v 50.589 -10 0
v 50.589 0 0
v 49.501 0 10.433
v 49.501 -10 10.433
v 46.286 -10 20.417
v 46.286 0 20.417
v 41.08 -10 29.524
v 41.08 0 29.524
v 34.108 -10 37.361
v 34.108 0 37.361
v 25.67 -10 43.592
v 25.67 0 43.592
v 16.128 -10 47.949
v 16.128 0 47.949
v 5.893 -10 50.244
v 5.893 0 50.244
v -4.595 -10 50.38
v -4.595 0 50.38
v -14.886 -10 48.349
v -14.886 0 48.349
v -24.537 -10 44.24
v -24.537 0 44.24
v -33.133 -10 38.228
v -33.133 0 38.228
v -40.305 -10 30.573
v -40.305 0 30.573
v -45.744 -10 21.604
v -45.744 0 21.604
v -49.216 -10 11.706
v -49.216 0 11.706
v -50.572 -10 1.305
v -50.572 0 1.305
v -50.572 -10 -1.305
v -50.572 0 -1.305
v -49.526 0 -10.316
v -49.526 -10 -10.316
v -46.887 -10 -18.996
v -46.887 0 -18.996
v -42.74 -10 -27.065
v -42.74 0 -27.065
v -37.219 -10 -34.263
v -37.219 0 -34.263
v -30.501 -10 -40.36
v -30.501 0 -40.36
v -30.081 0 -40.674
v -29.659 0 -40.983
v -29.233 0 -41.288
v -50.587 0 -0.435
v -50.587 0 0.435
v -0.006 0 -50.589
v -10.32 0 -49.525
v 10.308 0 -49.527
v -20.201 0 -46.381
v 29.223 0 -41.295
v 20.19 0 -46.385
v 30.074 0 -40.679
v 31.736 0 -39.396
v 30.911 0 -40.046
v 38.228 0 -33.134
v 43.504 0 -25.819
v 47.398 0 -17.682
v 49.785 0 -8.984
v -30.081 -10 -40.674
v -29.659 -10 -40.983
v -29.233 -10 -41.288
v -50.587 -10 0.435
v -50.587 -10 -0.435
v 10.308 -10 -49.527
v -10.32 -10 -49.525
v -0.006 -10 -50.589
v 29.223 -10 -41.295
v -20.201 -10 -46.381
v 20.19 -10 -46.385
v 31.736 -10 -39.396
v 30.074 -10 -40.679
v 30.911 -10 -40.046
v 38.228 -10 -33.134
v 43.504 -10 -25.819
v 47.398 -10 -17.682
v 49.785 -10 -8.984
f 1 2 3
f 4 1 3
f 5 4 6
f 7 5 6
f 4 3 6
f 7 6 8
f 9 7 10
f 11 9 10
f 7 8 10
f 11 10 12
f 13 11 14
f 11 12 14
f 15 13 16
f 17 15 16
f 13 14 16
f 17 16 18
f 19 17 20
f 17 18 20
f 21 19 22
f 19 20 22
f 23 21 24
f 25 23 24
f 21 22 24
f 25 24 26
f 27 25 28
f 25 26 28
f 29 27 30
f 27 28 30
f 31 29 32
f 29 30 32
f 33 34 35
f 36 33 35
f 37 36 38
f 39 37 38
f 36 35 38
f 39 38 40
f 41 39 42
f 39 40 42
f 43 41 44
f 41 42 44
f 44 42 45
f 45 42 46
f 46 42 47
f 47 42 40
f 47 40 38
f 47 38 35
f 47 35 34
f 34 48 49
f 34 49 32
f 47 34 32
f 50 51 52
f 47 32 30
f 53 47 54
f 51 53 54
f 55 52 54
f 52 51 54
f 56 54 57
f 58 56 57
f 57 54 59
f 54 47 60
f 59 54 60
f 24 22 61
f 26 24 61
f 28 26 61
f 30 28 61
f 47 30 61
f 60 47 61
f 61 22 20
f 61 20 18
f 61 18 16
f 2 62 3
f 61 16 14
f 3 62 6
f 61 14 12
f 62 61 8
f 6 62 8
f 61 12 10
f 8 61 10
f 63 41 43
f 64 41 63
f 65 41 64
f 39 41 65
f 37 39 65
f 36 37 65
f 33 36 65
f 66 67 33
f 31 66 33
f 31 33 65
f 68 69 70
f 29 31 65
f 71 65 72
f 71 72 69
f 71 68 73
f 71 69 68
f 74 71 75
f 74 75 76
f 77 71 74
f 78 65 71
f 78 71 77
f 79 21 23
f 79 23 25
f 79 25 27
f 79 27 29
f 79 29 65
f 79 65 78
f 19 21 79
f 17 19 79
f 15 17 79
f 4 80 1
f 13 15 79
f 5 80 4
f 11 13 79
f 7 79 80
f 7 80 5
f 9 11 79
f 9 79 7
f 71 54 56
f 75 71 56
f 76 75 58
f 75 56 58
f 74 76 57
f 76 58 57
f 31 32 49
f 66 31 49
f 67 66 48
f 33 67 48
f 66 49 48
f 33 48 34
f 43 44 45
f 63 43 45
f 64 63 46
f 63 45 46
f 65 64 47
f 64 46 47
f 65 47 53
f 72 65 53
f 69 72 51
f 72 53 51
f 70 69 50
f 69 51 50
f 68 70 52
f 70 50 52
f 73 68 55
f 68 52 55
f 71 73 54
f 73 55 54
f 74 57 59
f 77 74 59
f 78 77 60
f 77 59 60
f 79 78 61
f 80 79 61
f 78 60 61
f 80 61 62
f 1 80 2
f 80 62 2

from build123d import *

# Parameters (mm, degrees)
F1_DEPTH = 10


# Not quite as in the source:
# - a feature names something its author has since deleted; it is built from what else it names


with BuildPart() as f1:
    # F0 (on Front) → F1 (new body)
    with BuildSketch(Plane.XZ):
        with BuildLine():
            ThreePointArc((0, 12.4140736889), (4.3797238065, 11.6158187371), (8.1961939537, 9.3237133283))
            Line((8.1961939537, 9.3237133283), (21.0697077151, 23.9681876437))
            ThreePointArc((21.0697077151, 23.9681876437), (18.4530079812, 27.8283575749), (18.0439527664, 32.4738611241))
            Line((18.0439527664, 32.4738611241), (12.5602155062, 33.3932852461))
            Line((12.5602155062, 33.3932852461), (7.5710593451, 36.5340338213))
            ThreePointArc((7.5710593451, 36.5340338213), (4.3242109258, 33.4682836339), (0, 32.3538112298))
            Line((0, 32.3538112298), (0, 12.4140736889))
        make_face()
        with BuildLine():
            ThreePointArc((-7.9262057201, 9.554291624), (-4.2131665816, 11.6772622181), (0, 12.4140736889))
            Line((0, 12.4140736889), (0, 32.3538112298))
            ThreePointArc((0, 32.3538112298), (-4.3563302657, 33.4861038791), (-7.6099407791, 36.5963641019))
            Line((-7.6099407791, 36.5963641019), (-12.278520326, 33.7106778775))
            Line((-12.278520326, 33.7106778775), (-17.78879081, 33.0882026957))
            ThreePointArc((-17.78879081, 33.0882026957), (-17.7466642393, 32.5900633313), (-17.73260723, 32.0903435349))
            ThreePointArc((-17.73260723, 32.0903435349), (-18.5760333574, 28.310954716), (-20.9462636845, 25.2487405378))
            Line((-20.9462636845, 25.2487405378), (-7.9262057201, 9.554291624))
        make_face()
        with BuildLine():
            Line((-12.278520326, 33.7106778775), (-7.6099407791, 36.5963641019))
            ThreePointArc((-7.6099407791, 36.5963641019), (-8.921680068, 41.9636267042), (-6.8304445709, 47.0778130421))
            ThreePointArc((-6.8304445709, 47.0778130421), (-17.0260006599, 47.3423785206), (-24.8514976267, 40.8016632631))
            ThreePointArc((-24.8514976267, 40.8016632631), (-20.0657845476, 38.0934673525), (-17.78879081, 33.0882026957))
            Line((-17.78879081, 33.0882026957), (-12.278520326, 33.7106778775))
        make_face()
        with BuildLine():
            ThreePointArc((-6.8304445709, 47.0778130421), (-8.921680068, 41.9636267042), (-7.6099407791, 36.5963641019))
            Line((-7.6099407791, 36.5963641019), (0, 41.3001291454))
            ThreePointArc((0, 41.3001291454), (-2.9563177988, 44.7314932731), (-6.8304445709, 47.0778130421))
        make_face()
        with BuildLine():
            ThreePointArc((-6.8304445709, 47.0778130421), (-2.9563177988, 44.7314932731), (0, 41.3001291454))
            ThreePointArc((0, 41.3001291454), (2.9670877078, 44.7179968563), (6.8263210631, 47.0826843755))
            ThreePointArc((6.8263210631, 47.0826843755), (-0.0031911285, 50.2464464918), (-6.8304445709, 47.0778130421))
        make_face()
        with BuildLine():
            Line((0, 41.3001291454), (7.5710593451, 36.5340338213))
            ThreePointArc((7.5710593451, 36.5340338213), (8.5956299393, 38.8198569439), (8.9463179156, 41.3001291454))
            ThreePointArc((8.9463179156, 41.3001291454), (8.3996143563, 44.3795906098), (6.8263210631, 47.0826843755))
            ThreePointArc((6.8263210631, 47.0826843755), (2.9670877078, 44.7179968563), (0, 41.3001291454))
        make_face()
        with BuildLine():
            Line((0, 41.3001291454), (0, 32.3538112298))
            ThreePointArc((0, 32.3538112298), (4.3242109258, 33.4682836339), (7.5710593451, 36.5340338213))
            Line((7.5710593451, 36.5340338213), (0, 41.3001291454))
        make_face()
        with BuildLine():
            ThreePointArc((-7.6099407791, 36.5963641019), (-4.3563302657, 33.4861038791), (0, 32.3538112298))
            Line((0, 32.3538112298), (0, 41.3001291454))
            Line((0, 41.3001291454), (-7.6099407791, 36.5963641019))
        make_face()
        with BuildLine():
            ThreePointArc((36.4223056753, 29.9139118839), (45.9083800473, 20.8806963335), (46.4937895072, 7.7947540314))
            ThreePointArc((46.4937895072, 7.7947540314), (49.4692239822, 4.3915233547), (50.5414702125, 0))
            ThreePointArc((50.5414702125, 0), (49.3916524089, -4.5377847699), (46.2196804198, -7.9804821571))
            ThreePointArc((46.2196804198, -7.9804821571), (45.2541028323, -22.5688235592), (34.2624022156, -32.2090809466))
            ThreePointArc((34.2624022156, -32.2090809466), (34.2845647661, -32.5811281227), (34.291956159, -32.953761518))
            ThreePointArc((34.291956159, -32.953761518), (33.6295574849, -36.4193105223), (31.7357494034, -39.3962708606))
            ThreePointArc((31.7357494034, -39.3962708606), (45.6327545118, -21.8374829955), (50.5887729434, 0))
            ThreePointArc((50.5887729434, 0), (0.6523386875, 50.5845668377), (-50.5719492199, 1.3045689002))
            ThreePointArc((-50.5719492199, 1.3045689002), (-49.1901644057, 5.1967911583), (-46.3448391854, 8.1905927165))
            ThreePointArc((-46.3448391854, 8.1905927165), (-45.5368746407, 21.848912941), (-35.4561087337, 31.0998954179))
            ThreePointArc((-35.4561087337, 31.0998954179), (-32.6224058372, 38.6491093328), (-24.8514976267, 40.8016632631))
            ThreePointArc((-24.8514976267, 40.8016632631), (-17.0260006599, 47.3423785206), (-6.8304445709, 47.0778130421))
            ThreePointArc((-6.8304445709, 47.0778130421), (-0.0031911285, 50.2464464918), (6.8263210631, 47.0826843755))
            ThreePointArc((6.8263210631, 47.0826843755), (17.6788975714, 47.324411831), (25.7932452382, 40.1137106881))
            ThreePointArc((25.7932452382, 40.1137106881), (33.2437406928, 37.9811469414), (36.4791003688, 30.9391189367))
            ThreePointArc((36.4791003688, 30.9391189367), (36.4648908183, 30.425729431), (36.4223056753, 29.9139118839))
        make_face()
        with BuildLine():
            ThreePointArc((-46.3448391854, 8.1905927165), (-40.2671562667, 9.9229363025), (-34.3745943291, 7.6388702415))
            Line((-34.3745943291, 7.6388702415), (-29.0687931112, 14.021677727))
            Line((-29.0687931112, 14.021677727), (-27.8149031494, 23.2813171291))
            ThreePointArc((-27.8149031494, 23.2813171291), (-32.9795051289, 25.8770971269), (-35.4561087337, 31.0998954179))
            ThreePointArc((-35.4561087337, 31.0998954179), (-45.5368746407, 21.848912941), (-46.3448391854, 8.1905927165))
        make_face()
        with BuildLine():
            ThreePointArc((-35.4561087337, 31.0998954179), (-32.9795051289, 25.8770971269), (-27.8149031494, 23.2813171291))
            Line((-27.8149031494, 23.2813171291), (-26.6220327467, 32.0903435349))
            ThreePointArc((-26.6220327467, 32.0903435349), (-31.1003542851, 32.1417240723), (-35.4561087337, 31.0998954179))
        make_face()
        with BuildLine():
            ThreePointArc((-35.4561087337, 31.0998954179), (-31.1003542851, 32.1417240723), (-26.6220327467, 32.0903435349))
            ThreePointArc((-26.6220327467, 32.0903435349), (-26.4240541647, 36.5856916795), (-24.8514976267, 40.8016632631))
            ThreePointArc((-24.8514976267, 40.8016632631), (-32.6224058372, 38.6491093328), (-35.4561087337, 31.0998954179))
        make_face()
        with BuildLine():
            ThreePointArc((-24.8514976267, 40.8016632631), (-26.4240541647, 36.5856916795), (-26.6220327467, 32.0903435349))
            Line((-26.6220327467, 32.0903435349), (-17.78879081, 33.0882026957))
            ThreePointArc((-17.78879081, 33.0882026957), (-20.0657845476, 38.0934673525), (-24.8514976267, 40.8016632631))
        make_face()
        with BuildLine():
            Line((-26.6220327467, 32.0903435349), (-20.9462636845, 25.2487405378))
            ThreePointArc((-20.9462636845, 25.2487405378), (-18.5760333574, 28.310954716), (-17.73260723, 32.0903435349))
            ThreePointArc((-17.73260723, 32.0903435349), (-17.7466642393, 32.5900633313), (-17.78879081, 33.0882026957))
            Line((-17.78879081, 33.0882026957), (-26.6220327467, 32.0903435349))
        make_face()
        with BuildLine():
            ThreePointArc((-27.8149031494, 23.2813171291), (-24.1742207002, 23.544578373), (-20.9462636845, 25.2487405378))
            Line((-20.9462636845, 25.2487405378), (-26.6220327467, 32.0903435349))
            Line((-26.6220327467, 32.0903435349), (-27.8149031494, 23.2813171291))
        make_face()
        with BuildLine():
            Line((-30.7910450859, 0), (-12.4140736889, 0))
            ThreePointArc((-12.4140736889, 0), (-11.2362299602, 5.27791264), (-7.9262057201, 9.554291624))
            Line((-7.9262057201, 9.554291624), (-20.9462636845, 25.2487405378))
            ThreePointArc((-20.9462636845, 25.2487405378), (-24.1742207002, 23.544578373), (-27.8149031494, 23.2813171291))
            Line((-27.8149031494, 23.2813171291), (-29.0687931112, 14.021677727))
            Line((-29.0687931112, 14.021677727), (-34.3745943291, 7.6388702415))
            ThreePointArc((-34.3745943291, 7.6388702415), (-31.7314462624, 4.2188317027), (-30.7910450859, 0))
        make_face()
        with BuildLine():
            ThreePointArc((-34.0750304122, -7.3795789352), (-31.6491009662, -4.0386490589), (-30.7910450859, 0))
            Line((-30.7910450859, 0), (-40.7245159149, 0))
            Line((-40.7245159149, 0), (-34.0750304122, -7.3795789352))
        make_face()
        with BuildLine():
            Line((-40.7245159149, 0), (-30.7910450859, 0))
            ThreePointArc((-30.7910450859, 0), (-31.7314462624, 4.2188317027), (-34.3745943291, 7.6388702415))
            Line((-34.3745943291, 7.6388702415), (-40.7245159149, 0))
        make_face()
        with BuildLine():
            Line((-40.7245159149, 0), (-34.3745943291, 7.6388702415))
            ThreePointArc((-34.3745943291, 7.6388702415), (-40.2671562667, 9.9229363025), (-46.3448391854, 8.1905927165))
            ThreePointArc((-46.3448391854, 8.1905927165), (-44.1031958217, 3.7051833857), (-40.7245159149, 0))
        make_face()
        with BuildLine():
            ThreePointArc((-46.139511468, -8.3277647585), (-43.9781949987, -3.8087367386), (-40.7245159149, 0))
            ThreePointArc((-40.7245159149, 0), (-44.1031958217, 3.7051833857), (-46.3448391854, 8.1905927165))
            ThreePointArc((-46.3448391854, 8.1905927165), (-49.1901644057, 5.1967911583), (-50.5719492199, 1.3045689002))
            ThreePointArc((-50.5719492199, 1.3045689002), (-50.5887729434, 0), (-50.5719492199, -1.3045689002))
            ThreePointArc((-50.5719492199, -1.3045689002), (-49.1249179099, -5.3016119279), (-46.139511468, -8.3277647585))
        make_face()
        with BuildLine():
            ThreePointArc((-46.139511468, -8.3277647585), (-39.9462129869, -9.9029332657), (-34.0750304122, -7.3795789352))
            Line((-34.0750304122, -7.3795789352), (-40.7245159149, 0))
            ThreePointArc((-40.7245159149, 0), (-43.9781949987, -3.8087367386), (-46.139511468, -8.3277647585))
        make_face()
        with BuildLine():
            ThreePointArc((-30.5009303557, -40.3598463247), (-33.0177016325, -36.8777345609), (-33.7279636415, -32.640427884))
            ThreePointArc((-33.7279636415, -32.640427884), (-44.9854308164, -23.0629718726), (-46.139511468, -8.3277647585))
            ThreePointArc((-46.139511468, -8.3277647585), (-49.1249179099, -5.3016119279), (-50.5719492199, -1.3045689002))
            ThreePointArc((-50.5719492199, -1.3045689002), (-44.9947955251, -23.1234150499), (-30.5009303557, -40.3598463247))
        make_face()
        with BuildLine():
            ThreePointArc((-33.7279636415, -32.640427884), (-31.3725828689, -26.9858355888), (-26.0396213441, -23.9722407284))
            Line((-26.0396213441, -23.9722407284), (-27.8331619734, -14.3067856835))
            Line((-27.8331619734, -14.3067856835), (-34.0750304122, -7.3795789352))
            ThreePointArc((-34.0750304122, -7.3795789352), (-39.9462129869, -9.9029332657), (-46.139511468, -8.3277647585))
            ThreePointArc((-46.139511468, -8.3277647585), (-44.9854308164, -23.0629718726), (-33.7279636415, -32.640427884))
        make_face()
        with BuildLine():
            Line((-18.7530413406, -25.632855502), (-7.3299455485, -10.0190380681))
            ThreePointArc((-7.3299455485, -10.0190380681), (-11.0703141267, -5.6175947424), (-12.4140736889, 0))
            Line((-12.4140736889, 0), (-30.7910450859, 0))
            ThreePointArc((-30.7910450859, 0), (-31.6491009662, -4.0386490589), (-34.0750304122, -7.3795789352))
            Line((-34.0750304122, -7.3795789352), (-27.8331619734, -14.3067856835))
            Line((-27.8331619734, -14.3067856835), (-26.0396213441, -23.9722407284))
            ThreePointArc((-26.0396213441, -23.9722407284), (-22.2247546471, -24.0496899951), (-18.7530413406, -25.632855502))
        make_face()
        with BuildLine():
            Line((-24.3195872754, -33.2415662706), (-18.7530413406, -25.632855502))
            ThreePointArc((-18.7530413406, -25.632855502), (-22.2247546471, -24.0496899951), (-26.0396213441, -23.9722407284))
            Line((-26.0396213441, -23.9722407284), (-24.3195872754, -33.2415662706))
        make_face()
        with BuildLine():
            Line((-24.3195872754, -33.2415662706), (-26.0396213441, -23.9722407284))
            ThreePointArc((-26.0396213441, -23.9722407284), (-31.3725828689, -26.9858355888), (-33.7279636415, -32.640427884))
            ThreePointArc((-33.7279636415, -32.640427884), (-29.0611287118, -33.5256103283), (-24.3195872754, -33.2415662706))
        make_face()
        with BuildLine():
            ThreePointArc((-22.7066374003, -42.5301240653), (-24.4011253438, -38.0400478438), (-24.3195872754, -33.2415662706))
            ThreePointArc((-24.3195872754, -33.2415662706), (-29.0611287118, -33.5256103283), (-33.7279636415, -32.640427884))
            ThreePointArc((-33.7279636415, -32.640427884), (-33.0177016325, -36.8777345609), (-30.5009303557, -40.3598463247))
            ThreePointArc((-30.5009303557, -40.3598463247), (-29.8703681269, -40.8287283157), (-29.2325991317, -41.2877596379))
            ThreePointArc((-29.2325991317, -41.2877596379), (-26.0826725293, -42.5027996438), (-22.7066374003, -42.5301240653))
        make_face()
        with BuildLine():
            Line((-15.0911921565, -35.1691649674), (-24.3195872754, -33.2415662706))
            ThreePointArc((-24.3195872754, -33.2415662706), (-24.4011253438, -38.0400478438), (-22.7066374003, -42.5301240653))
            ThreePointArc((-22.7066374003, -42.5301240653), (-17.7675173712, -40.0201570663), (-15.0911921565, -35.1691649674))
        make_face()
        with BuildLine():
            ThreePointArc((-14.8920259149, -33.2415662706), (-15.9125108938, -28.9754228225), (-18.7530413406, -25.632855502))
            Line((-18.7530413406, -25.632855502), (-24.3195872754, -33.2415662706))
            Line((-24.3195872754, -33.2415662706), (-15.0911921565, -35.1691649674))
            ThreePointArc((-15.0911921565, -35.1691649674), (-14.9419496612, -34.2104965993), (-14.8920259149, -33.2415662706))
        make_face()
        with BuildLine():
            Line((0, -31.5046176402), (0, -12.4140736889))
            ThreePointArc((0, -12.4140736889), (-3.8556548526, -11.8001335252), (-7.3299455485, -10.0190380681))
            Line((-7.3299455485, -10.0190380681), (-18.7530413406, -25.632855502))
            ThreePointArc((-18.7530413406, -25.632855502), (-15.9125108938, -28.9754228225), (-14.8920259149, -33.2415662706))
            ThreePointArc((-14.8920259149, -33.2415662706), (-14.9419496612, -34.2104965993), (-15.0911921565, -35.1691649674))
            Line((-15.0911921565, -35.1691649674), (-11.8124056821, -35.854027769))
            Line((-11.8124056821, -35.854027769), (-8.5237688791, -37.209996633))
            ThreePointArc((-8.5237688791, -37.209996633), (-5.1284984488, -33.0625960348), (0, -31.5046176402))
        make_face()
        with BuildLine():
            ThreePointArc((-6.3531457642, -47.4061283415), (-9.0178114186, -42.6442863227), (-8.5237688791, -37.209996633))
            Line((-8.5237688791, -37.209996633), (-11.8124056821, -35.854027769))
            Line((-11.8124056821, -35.854027769), (-15.0911921565, -35.1691649674))
            ThreePointArc((-15.0911921565, -35.1691649674), (-17.7675173712, -40.0201570663), (-22.7066374003, -42.5301240653))
            ThreePointArc((-22.7066374003, -42.5301240653), (-15.4632390175, -48.0984535393), (-6.3531457642, -47.4061283415))
        make_face()
        with BuildLine():
            ThreePointArc((29.2228790167, -41.2946399656), (26.2897143388, -42.2464687444), (23.206366099, -42.197512799))
            ThreePointArc((23.206366099, -42.197512799), (15.8115613872, -47.9336831156), (6.4750778857, -47.288034253))
            ThreePointArc((6.4750778857, -47.288034253), (0.0848729286, -49.9440160857), (-6.3531457642, -47.4061283415))
            ThreePointArc((-6.3531457642, -47.4061283415), (-15.4632390175, -48.0984535393), (-22.7066374003, -42.5301240653))
            ThreePointArc((-22.7066374003, -42.5301240653), (-26.0826725293, -42.5027996438), (-29.2325991317, -41.2877596379))
            ThreePointArc((-29.2325991317, -41.2877596379), (-0.0059544006, -50.588772593), (29.2228790167, -41.2946399656))
        make_face()
        with BuildLine():
            Line((19.2309829091, -25.4560439964), (7.4830019114, -9.905246486))
            ThreePointArc((7.4830019114, -9.905246486), (3.9461858655, -11.7701674869), (0, -12.4140736889))
            Line((0, -12.4140736889), (0, -31.5046176402))
            ThreePointArc((0, -31.5046176402), (5.0176698122, -32.9895625997), (8.4190600767, -36.9660706339))
            Line((8.4190600767, -36.9660706339), (11.9896721342, -35.3720759819))
            Line((11.9896721342, -35.3720759819), (15.6591926585, -34.6844592594))
            ThreePointArc((15.6591926585, -34.6844592594), (16.1319190758, -29.5619993381), (19.2309829091, -25.4560439964))
        make_face()
        with BuildLine():
            ThreePointArc((23.206366099, -42.197512799), (18.2657550813, -39.6133102694), (15.6591926585, -34.6844592594))
            Line((15.6591926585, -34.6844592594), (11.9896721342, -35.3720759819))
            Line((11.9896721342, -35.3720759819), (8.4190600767, -36.9660706339))
            ThreePointArc((8.4190600767, -36.9660706339), (9.0174636571, -38.8031052324), (9.2198945494, -40.7245121896))
            ThreePointArc((9.2198945494, -40.7245121896), (8.5060563956, -44.2816824271), (6.4750778857, -47.288034253))
            ThreePointArc((6.4750778857, -47.288034253), (15.8115613872, -47.9336831156), (23.206366099, -42.197512799))
        make_face()
        with BuildLine():
            ThreePointArc((8.4190600767, -36.9660706339), (5.0176698122, -32.9895625997), (0, -31.5046176402))
            Line((0, -31.5046176402), (0, -40.7245121896))
            Line((0, -40.7245121896), (8.4190600767, -36.9660706339))
        make_face()
        with BuildLine():
            Line((0, -40.7245121896), (0, -31.5046176402))
            ThreePointArc((0, -31.5046176402), (-5.1284984488, -33.0625960348), (-8.5237688791, -37.209996633))
            Line((-8.5237688791, -37.209996633), (0, -40.7245121896))
        make_face()
        with BuildLine():
            Line((0, -40.7245121896), (-8.5237688791, -37.209996633))
            ThreePointArc((-8.5237688791, -37.209996633), (-9.0178114186, -42.6442863227), (-6.3531457642, -47.4061283415))
            ThreePointArc((-6.3531457642, -47.4061283415), (-2.5528912915, -44.6583414697), (0, -40.7245121896))
        make_face()
        with BuildLine():
            ThreePointArc((6.4750778857, -47.288034253), (2.6424912294, -44.5933026018), (0, -40.7245121896))
            ThreePointArc((0, -40.7245121896), (-2.5528912915, -44.6583414697), (-6.3531457642, -47.4061283415))
            ThreePointArc((-6.3531457642, -47.4061283415), (0.0848729286, -49.9440160857), (6.4750778857, -47.288034253))
        make_face()
        with BuildLine():
            ThreePointArc((9.2198945494, -40.7245121896), (9.0174636571, -38.8031052324), (8.4190600767, -36.9660706339))
            Line((8.4190600767, -36.9660706339), (0, -40.7245121896))
            ThreePointArc((0, -40.7245121896), (2.6424912294, -44.5933026018), (6.4750778857, -47.288034253))
            ThreePointArc((6.4750778857, -47.288034253), (8.5060563956, -44.2816824271), (9.2198945494, -40.7245121896))
        make_face()
        with BuildLine():
            Line((31.4831711226, 0), (12.4140736889, 0))
            ThreePointArc((12.4140736889, 0), (11.113140031, -5.5323904603), (7.4830019114, -9.905246486))
            Line((7.4830019114, -9.905246486), (19.2309829091, -25.4560439964))
            ThreePointArc((19.2309829091, -25.4560439964), (22.6706111136, -23.8241226738), (26.4754028959, -23.6908227053))
            Line((26.4754028959, -23.6908227053), (28.1101843832, -14.1079709863))
            Line((28.1101843832, -14.1079709863), (34.5814156225, -7.0319379514))
            ThreePointArc((34.5814156225, -7.0319379514), (32.2920641652, -3.8421110842), (31.4831711226, 0))
        make_face()
        with BuildLine():
            ThreePointArc((46.2196804198, -7.9804821571), (40.2382406985, -9.4976571454), (34.5814156225, -7.0319379514))
            Line((34.5814156225, -7.0319379514), (28.1101843832, -14.1079709863))
            Line((28.1101843832, -14.1079709863), (26.4754028959, -23.6908227053))
            ThreePointArc((26.4754028959, -23.6908227053), (31.8307310628, -26.6136155389), (34.2624022156, -32.2090809466))
            ThreePointArc((34.2624022156, -32.2090809466), (45.2541028323, -22.5688235592), (46.2196804198, -7.9804821571))
        make_face()
        with BuildLine():
            ThreePointArc((8.1961939537, 9.3237133283), (11.3105566013, 5.1166917947), (12.4140736889, 0))
            Line((12.4140736889, 0), (31.4831711226, 0))
            ThreePointArc((31.4831711226, 0), (32.4069275416, 4.0929085256), (34.9990987759, 7.3922833775))
            Line((34.9990987759, 7.3922833775), (29.9410622795, 13.6103208604))
            Line((29.9410622795, 13.6103208604), (28.6489670456, 21.7718335631))
            ThreePointArc((28.6489670456, 21.7718335631), (24.6142989754, 22.0244230757), (21.0697077151, 23.9681876437))
            Line((21.0697077151, 23.9681876437), (8.1961939537, 9.3237133283))
        make_face()
        with BuildLine():
            Line((12.5602155062, 33.3932852461), (18.0439527664, 32.4738611241))
            ThreePointArc((18.0439527664, 32.4738611241), (20.681498993, 37.5486077071), (25.7932452382, 40.1137106881))
            ThreePointArc((25.7932452382, 40.1137106881), (17.6788975714, 47.324411831), (6.8263210631, 47.0826843755))
            ThreePointArc((6.8263210631, 47.0826843755), (8.3996143563, 44.3795906098), (8.9463179156, 41.3001291454))
            ThreePointArc((8.9463179156, 41.3001291454), (8.5956299393, 38.8198569439), (7.5710593451, 36.5340338213))
            Line((7.5710593451, 36.5340338213), (12.5602155062, 33.3932852461))
        make_face()
        with BuildLine():
            ThreePointArc((26.4754028959, -23.6908227053), (22.6706111136, -23.8241226738), (19.2309829091, -25.4560439964))
            Line((19.2309829091, -25.4560439964), (24.8951967806, -32.953761518))
            Line((24.8951967806, -32.953761518), (26.4754028959, -23.6908227053))
        make_face()
        with BuildLine():
            Line((24.8951967806, -32.953761518), (19.2309829091, -25.4560439964))
            ThreePointArc((19.2309829091, -25.4560439964), (16.1319190758, -29.5619993381), (15.6591926585, -34.6844592594))
            Line((15.6591926585, -34.6844592594), (24.8951967806, -32.953761518))
        make_face()
        with BuildLine():
            ThreePointArc((34.2624022156, -32.2090809466), (31.8307310628, -26.6136155389), (26.4754028959, -23.6908227053))
            Line((26.4754028959, -23.6908227053), (24.8951967806, -32.953761518))
            ThreePointArc((24.8951967806, -32.953761518), (29.6252644616, -33.1658958053), (34.2624022156, -32.2090809466))
        make_face()
        with BuildLine():
            ThreePointArc((46.4937895072, 7.7947540314), (44.2923929818, 3.5181009217), (41.0123206675, 0))
            ThreePointArc((41.0123206675, 0), (44.1211918052, -3.6605977574), (46.2196804198, -7.9804821571))
            ThreePointArc((46.2196804198, -7.9804821571), (49.3916524089, -4.5377847699), (50.5414702125, 0))
            ThreePointArc((50.5414702125, 0), (49.4692239822, 4.3915233547), (46.4937895072, 7.7947540314))
        make_face()
        with BuildLine():
            Line((41.0123206675, 0), (34.5814156225, -7.0319379514))
            ThreePointArc((34.5814156225, -7.0319379514), (40.2382406985, -9.4976571454), (46.2196804198, -7.9804821571))
            ThreePointArc((46.2196804198, -7.9804821571), (44.1211918052, -3.6605977574), (41.0123206675, 0))
        make_face()
        with BuildLine():
            ThreePointArc((46.4937895072, 7.7947540314), (40.678875044, 9.523313765), (34.9990987759, 7.3922833775))
            Line((34.9990987759, 7.3922833775), (41.0123206675, 0))
            ThreePointArc((41.0123206675, 0), (44.2923929818, 3.5181009217), (46.4937895072, 7.7947540314))
        make_face()
        with BuildLine():
            Line((29.9410622795, 13.6103208604), (34.9990987759, 7.3922833775))
            ThreePointArc((34.9990987759, 7.3922833775), (40.678875044, 9.523313765), (46.4937895072, 7.7947540314))
            ThreePointArc((46.4937895072, 7.7947540314), (45.9083800473, 20.8806963335), (36.4223056753, 29.9139118839))
            ThreePointArc((36.4223056753, 29.9139118839), (33.9108785019, 24.5299127589), (28.6489670456, 21.7718335631))
            Line((28.6489670456, 21.7718335631), (29.9410622795, 13.6103208604))
        make_face()
        with BuildLine():
            Line((24.8951967806, -32.953761518), (15.6591926585, -34.6844592594))
            ThreePointArc((15.6591926585, -34.6844592594), (18.2657550813, -39.6133102694), (23.206366099, -42.197512799))
            ThreePointArc((23.206366099, -42.197512799), (24.9060219327, -37.7318893488), (24.8951967806, -32.953761518))
        make_face()
        with BuildLine():
            ThreePointArc((34.2624022156, -32.2090809466), (29.6252644616, -33.1658958053), (24.8951967806, -32.953761518))
            ThreePointArc((24.8951967806, -32.953761518), (24.9060219327, -37.7318893488), (23.206366099, -42.197512799))
            ThreePointArc((23.206366099, -42.197512799), (26.2897143388, -42.2464687444), (29.2228790167, -41.2946399656))
            ThreePointArc((29.2228790167, -41.2946399656), (30.494090346, -40.3650145781), (31.7357494034, -39.3962708606))
            ThreePointArc((31.7357494034, -39.3962708606), (33.6295574849, -36.4193105223), (34.291956159, -32.953761518))
            ThreePointArc((34.291956159, -32.953761518), (34.2845647661, -32.5811281227), (34.2624022156, -32.2090809466))
        make_face()
        with BuildLine():
            ThreePointArc((34.9990987759, 7.3922833775), (32.4069275416, 4.0929085256), (31.4831711226, 0))
            Line((31.4831711226, 0), (41.0123206675, 0))
            Line((41.0123206675, 0), (34.9990987759, 7.3922833775))
        make_face()
        with BuildLine():
            Line((41.0123206675, 0), (31.4831711226, 0))
            ThreePointArc((31.4831711226, 0), (32.2920641652, -3.8421110842), (34.5814156225, -7.0319379514))
            Line((34.5814156225, -7.0319379514), (41.0123206675, 0))
        make_face()
        with BuildLine():
            ThreePointArc((25.7932452382, 40.1137106881), (20.681498993, 37.5486077071), (18.0439527664, 32.4738611241))
            Line((18.0439527664, 32.4738611241), (27.1976422518, 30.9391189367))
            ThreePointArc((27.1976422518, 30.9391189367), (27.2310665217, 35.6390199788), (25.7932452382, 40.1137106881))
        make_face()
        with BuildLine():
            ThreePointArc((25.7932452382, 40.1137106881), (27.2310665217, 35.6390199788), (27.1976422518, 30.9391189367))
            ThreePointArc((27.1976422518, 30.9391189367), (31.8789975875, 31.0475799041), (36.4223056753, 29.9139118839))
            ThreePointArc((36.4223056753, 29.9139118839), (36.4648908183, 30.425729431), (36.4791003688, 30.9391189367))
            ThreePointArc((36.4791003688, 30.9391189367), (33.2437406928, 37.9811469414), (25.7932452382, 40.1137106881))
        make_face()
        with BuildLine():
            Line((27.1976422518, 30.9391189367), (28.6489670456, 21.7718335631))
            ThreePointArc((28.6489670456, 21.7718335631), (33.9108785019, 24.5299127589), (36.4223056753, 29.9139118839))
            ThreePointArc((36.4223056753, 29.9139118839), (31.8789975875, 31.0475799041), (27.1976422518, 30.9391189367))
        make_face()
        with BuildLine():
            Line((27.1976422518, 30.9391189367), (21.0697077151, 23.9681876437))
            ThreePointArc((21.0697077151, 23.9681876437), (24.6142989754, 22.0244230757), (28.6489670456, 21.7718335631))
            Line((28.6489670456, 21.7718335631), (27.1976422518, 30.9391189367))
        make_face()
        with BuildLine():
            ThreePointArc((18.0439527664, 32.4738611241), (18.4530079812, 27.8283575749), (21.0697077151, 23.9681876437))
            Line((21.0697077151, 23.9681876437), (27.1976422518, 30.9391189367))
            Line((27.1976422518, 30.9391189367), (18.0439527664, 32.4738611241))
        make_face()
        with BuildLine():
            Line((0, 0), (8.1961939537, 9.3237133283))
            ThreePointArc((8.1961939537, 9.3237133283), (4.3797238065, 11.6158187371), (0, 12.4140736889))
            Line((0, 12.4140736889), (0, 0))
        make_face()
        with BuildLine():
            Line((-7.9262057201, 9.554291624), (0, 0))
            Line((0, 0), (0, 12.4140736889))
            ThreePointArc((0, 12.4140736889), (-4.2131665816, 11.6772622181), (-7.9262057201, 9.554291624))
        make_face()
        with BuildLine():
            Line((-12.4140736889, 0), (0, 0))
            Line((0, 0), (-7.9262057201, 9.554291624))
            ThreePointArc((-7.9262057201, 9.554291624), (-11.2362299602, 5.27791264), (-12.4140736889, 0))
        make_face()
        with BuildLine():
            Line((-7.3299455485, -10.0190380681), (0, 0))
            Line((0, 0), (-12.4140736889, 0))
            ThreePointArc((-12.4140736889, 0), (-11.0703141267, -5.6175947424), (-7.3299455485, -10.0190380681))
        make_face()
        with BuildLine():
            Line((0, -12.4140736889), (0, 0))
            Line((0, 0), (-7.3299455485, -10.0190380681))
            ThreePointArc((-7.3299455485, -10.0190380681), (-3.8556548526, -11.8001335252), (0, -12.4140736889))
        make_face()
        with BuildLine():
            ThreePointArc((0, -12.4140736889), (3.9461858655, -11.7701674869), (7.4830019114, -9.905246486))
            Line((7.4830019114, -9.905246486), (0, 0))
            Line((0, 0), (0, -12.4140736889))
        make_face()
        with BuildLine():
            ThreePointArc((7.4830019114, -9.905246486), (11.113140031, -5.5323904603), (12.4140736889, 0))
            Line((12.4140736889, 0), (0, 0))
            Line((0, 0), (7.4830019114, -9.905246486))
        make_face()
        with BuildLine():
            Line((0, 0), (12.4140736889, 0))
            ThreePointArc((12.4140736889, 0), (11.3105566013, 5.1166917947), (8.1961939537, 9.3237133283))
            Line((8.1961939537, 9.3237133283), (0, 0))
        make_face()
    extrude(amount=F1_DEPTH)


solid = f1.part
